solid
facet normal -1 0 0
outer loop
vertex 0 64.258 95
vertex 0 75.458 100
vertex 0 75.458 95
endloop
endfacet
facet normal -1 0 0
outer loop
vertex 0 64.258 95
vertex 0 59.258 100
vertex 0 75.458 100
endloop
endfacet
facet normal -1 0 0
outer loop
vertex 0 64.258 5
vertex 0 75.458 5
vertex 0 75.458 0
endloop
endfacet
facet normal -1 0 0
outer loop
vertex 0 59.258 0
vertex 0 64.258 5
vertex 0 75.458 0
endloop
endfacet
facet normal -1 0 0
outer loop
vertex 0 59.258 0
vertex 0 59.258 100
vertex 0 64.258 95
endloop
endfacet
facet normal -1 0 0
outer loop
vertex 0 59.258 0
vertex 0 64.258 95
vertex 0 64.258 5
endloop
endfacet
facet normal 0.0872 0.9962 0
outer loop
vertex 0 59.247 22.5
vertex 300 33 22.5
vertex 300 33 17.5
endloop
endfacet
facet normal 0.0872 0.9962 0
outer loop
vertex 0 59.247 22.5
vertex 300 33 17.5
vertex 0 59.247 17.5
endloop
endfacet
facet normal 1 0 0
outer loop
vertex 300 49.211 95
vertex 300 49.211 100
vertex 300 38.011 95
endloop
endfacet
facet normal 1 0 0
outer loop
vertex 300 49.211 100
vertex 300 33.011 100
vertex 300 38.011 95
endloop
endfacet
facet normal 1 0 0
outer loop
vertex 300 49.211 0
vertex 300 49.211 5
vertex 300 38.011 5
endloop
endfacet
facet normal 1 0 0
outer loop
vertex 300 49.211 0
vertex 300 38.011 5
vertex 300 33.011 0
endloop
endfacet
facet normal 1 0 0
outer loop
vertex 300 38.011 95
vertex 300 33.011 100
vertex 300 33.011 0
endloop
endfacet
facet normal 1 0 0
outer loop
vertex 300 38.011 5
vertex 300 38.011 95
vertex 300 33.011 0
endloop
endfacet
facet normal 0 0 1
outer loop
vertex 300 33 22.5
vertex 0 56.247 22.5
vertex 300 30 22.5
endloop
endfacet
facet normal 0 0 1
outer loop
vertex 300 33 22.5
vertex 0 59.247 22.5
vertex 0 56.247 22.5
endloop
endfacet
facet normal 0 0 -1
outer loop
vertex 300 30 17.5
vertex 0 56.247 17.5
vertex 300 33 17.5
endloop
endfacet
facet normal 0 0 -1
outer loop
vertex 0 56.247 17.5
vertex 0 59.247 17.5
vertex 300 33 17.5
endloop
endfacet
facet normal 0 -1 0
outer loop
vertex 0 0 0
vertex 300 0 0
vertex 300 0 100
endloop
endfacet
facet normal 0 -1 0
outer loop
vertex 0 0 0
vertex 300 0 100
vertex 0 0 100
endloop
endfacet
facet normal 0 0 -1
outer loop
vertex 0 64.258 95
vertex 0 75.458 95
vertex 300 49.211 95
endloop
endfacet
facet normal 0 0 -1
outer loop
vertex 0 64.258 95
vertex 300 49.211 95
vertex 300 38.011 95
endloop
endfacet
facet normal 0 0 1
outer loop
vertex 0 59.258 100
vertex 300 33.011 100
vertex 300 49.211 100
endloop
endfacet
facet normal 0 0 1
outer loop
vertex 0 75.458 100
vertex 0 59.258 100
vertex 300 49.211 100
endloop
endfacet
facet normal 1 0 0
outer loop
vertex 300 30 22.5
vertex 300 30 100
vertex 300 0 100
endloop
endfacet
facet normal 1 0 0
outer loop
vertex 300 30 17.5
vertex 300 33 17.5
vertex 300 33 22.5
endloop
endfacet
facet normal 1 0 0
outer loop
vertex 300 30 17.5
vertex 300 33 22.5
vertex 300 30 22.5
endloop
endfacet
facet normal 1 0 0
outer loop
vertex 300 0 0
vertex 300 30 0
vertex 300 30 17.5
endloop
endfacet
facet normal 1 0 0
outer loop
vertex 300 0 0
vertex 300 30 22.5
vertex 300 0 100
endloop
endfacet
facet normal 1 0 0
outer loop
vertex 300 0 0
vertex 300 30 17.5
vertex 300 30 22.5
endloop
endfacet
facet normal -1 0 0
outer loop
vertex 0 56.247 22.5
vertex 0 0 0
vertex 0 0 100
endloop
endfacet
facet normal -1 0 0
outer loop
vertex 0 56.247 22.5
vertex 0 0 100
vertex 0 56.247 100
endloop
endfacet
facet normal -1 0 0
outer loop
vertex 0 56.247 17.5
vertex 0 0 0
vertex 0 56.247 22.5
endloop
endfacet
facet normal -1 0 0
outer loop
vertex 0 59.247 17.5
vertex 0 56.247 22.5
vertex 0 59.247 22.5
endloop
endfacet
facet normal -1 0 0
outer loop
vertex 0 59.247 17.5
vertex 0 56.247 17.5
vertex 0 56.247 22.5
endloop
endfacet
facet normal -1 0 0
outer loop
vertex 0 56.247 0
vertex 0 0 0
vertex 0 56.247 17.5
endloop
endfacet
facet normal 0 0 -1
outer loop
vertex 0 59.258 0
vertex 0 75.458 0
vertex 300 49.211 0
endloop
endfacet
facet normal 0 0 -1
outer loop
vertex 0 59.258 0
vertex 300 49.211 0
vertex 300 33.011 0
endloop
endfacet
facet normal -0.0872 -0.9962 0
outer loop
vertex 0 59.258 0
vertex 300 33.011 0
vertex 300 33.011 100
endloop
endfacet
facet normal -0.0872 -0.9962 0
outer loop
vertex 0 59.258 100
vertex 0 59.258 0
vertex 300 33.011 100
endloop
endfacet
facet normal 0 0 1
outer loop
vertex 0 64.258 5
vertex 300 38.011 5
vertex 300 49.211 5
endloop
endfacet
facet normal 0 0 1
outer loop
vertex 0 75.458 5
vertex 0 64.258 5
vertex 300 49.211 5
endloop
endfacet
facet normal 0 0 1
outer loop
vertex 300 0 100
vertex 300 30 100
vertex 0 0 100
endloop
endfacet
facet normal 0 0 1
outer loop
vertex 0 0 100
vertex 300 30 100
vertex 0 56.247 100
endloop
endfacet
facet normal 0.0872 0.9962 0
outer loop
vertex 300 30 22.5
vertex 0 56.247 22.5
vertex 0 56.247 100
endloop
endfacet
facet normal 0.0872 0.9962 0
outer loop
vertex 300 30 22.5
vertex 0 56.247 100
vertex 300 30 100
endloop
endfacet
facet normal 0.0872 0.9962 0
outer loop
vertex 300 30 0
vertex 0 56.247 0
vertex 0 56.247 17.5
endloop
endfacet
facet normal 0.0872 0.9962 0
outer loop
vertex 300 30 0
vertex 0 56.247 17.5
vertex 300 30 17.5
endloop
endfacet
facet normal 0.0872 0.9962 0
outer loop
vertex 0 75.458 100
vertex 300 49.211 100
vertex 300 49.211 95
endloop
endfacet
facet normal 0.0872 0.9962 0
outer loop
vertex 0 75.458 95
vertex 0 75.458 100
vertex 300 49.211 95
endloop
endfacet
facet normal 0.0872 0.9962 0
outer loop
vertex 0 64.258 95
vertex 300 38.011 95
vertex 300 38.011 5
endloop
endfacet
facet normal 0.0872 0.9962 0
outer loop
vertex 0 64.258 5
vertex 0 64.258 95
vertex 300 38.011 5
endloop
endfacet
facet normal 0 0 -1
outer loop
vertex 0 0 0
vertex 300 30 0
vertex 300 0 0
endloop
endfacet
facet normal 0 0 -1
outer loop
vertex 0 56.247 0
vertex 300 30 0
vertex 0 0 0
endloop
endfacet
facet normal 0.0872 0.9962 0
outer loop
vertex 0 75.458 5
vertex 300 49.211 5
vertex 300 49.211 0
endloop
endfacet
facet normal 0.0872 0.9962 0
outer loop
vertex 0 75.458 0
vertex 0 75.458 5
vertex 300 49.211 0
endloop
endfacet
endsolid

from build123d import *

# Parameters (mm, degrees)
SALIENTE_EXTRUIR1_DEPTH = 100
SALIENTE_EXTRUIR2_DEPTH = 2.5


with BuildPart() as part:
    # Croquis1 → Saliente-Extruir1 (new body)
    with BuildSketch(Plane.XY):
        Polygon((0, 0), (0, 56.246599058), (300, 30), (300, 0), align=None)
    extrude(amount=SALIENTE_EXTRUIR1_DEPTH)

    # Croquis3 → Saliente-Extruir2 (add, symmetric)
    with BuildSketch(Plane.XY.offset(20)):
        Polygon((0, 56.246599058), (300, 30), (300, 33), (0, 59.246599058), align=None)
    extrude(amount=SALIENTE_EXTRUIR2_DEPTH, both=True)


with BuildPart() as body_2:
    # Barrer1: sweep along a path in Croquis4
    with BuildLine(Plane.XY.offset(20)) as barrer1_path:
        Line((0, 59.246599058), (300, 33))
    # Croquis5 → Barrer1 (sweep)
    with BuildSketch(Plane.ZY):
        Polygon((95, 75.457706055), (100, 75.457706055), (100, 59.25776596), (0, 59.25776596), (0, 75.457706055), (5, 75.457706055), (5, 64.25776596), (95, 64.25776596), align=None)
    sweep(path=barrer1_path.line)


solid = Compound([part.part, body_2.part])
